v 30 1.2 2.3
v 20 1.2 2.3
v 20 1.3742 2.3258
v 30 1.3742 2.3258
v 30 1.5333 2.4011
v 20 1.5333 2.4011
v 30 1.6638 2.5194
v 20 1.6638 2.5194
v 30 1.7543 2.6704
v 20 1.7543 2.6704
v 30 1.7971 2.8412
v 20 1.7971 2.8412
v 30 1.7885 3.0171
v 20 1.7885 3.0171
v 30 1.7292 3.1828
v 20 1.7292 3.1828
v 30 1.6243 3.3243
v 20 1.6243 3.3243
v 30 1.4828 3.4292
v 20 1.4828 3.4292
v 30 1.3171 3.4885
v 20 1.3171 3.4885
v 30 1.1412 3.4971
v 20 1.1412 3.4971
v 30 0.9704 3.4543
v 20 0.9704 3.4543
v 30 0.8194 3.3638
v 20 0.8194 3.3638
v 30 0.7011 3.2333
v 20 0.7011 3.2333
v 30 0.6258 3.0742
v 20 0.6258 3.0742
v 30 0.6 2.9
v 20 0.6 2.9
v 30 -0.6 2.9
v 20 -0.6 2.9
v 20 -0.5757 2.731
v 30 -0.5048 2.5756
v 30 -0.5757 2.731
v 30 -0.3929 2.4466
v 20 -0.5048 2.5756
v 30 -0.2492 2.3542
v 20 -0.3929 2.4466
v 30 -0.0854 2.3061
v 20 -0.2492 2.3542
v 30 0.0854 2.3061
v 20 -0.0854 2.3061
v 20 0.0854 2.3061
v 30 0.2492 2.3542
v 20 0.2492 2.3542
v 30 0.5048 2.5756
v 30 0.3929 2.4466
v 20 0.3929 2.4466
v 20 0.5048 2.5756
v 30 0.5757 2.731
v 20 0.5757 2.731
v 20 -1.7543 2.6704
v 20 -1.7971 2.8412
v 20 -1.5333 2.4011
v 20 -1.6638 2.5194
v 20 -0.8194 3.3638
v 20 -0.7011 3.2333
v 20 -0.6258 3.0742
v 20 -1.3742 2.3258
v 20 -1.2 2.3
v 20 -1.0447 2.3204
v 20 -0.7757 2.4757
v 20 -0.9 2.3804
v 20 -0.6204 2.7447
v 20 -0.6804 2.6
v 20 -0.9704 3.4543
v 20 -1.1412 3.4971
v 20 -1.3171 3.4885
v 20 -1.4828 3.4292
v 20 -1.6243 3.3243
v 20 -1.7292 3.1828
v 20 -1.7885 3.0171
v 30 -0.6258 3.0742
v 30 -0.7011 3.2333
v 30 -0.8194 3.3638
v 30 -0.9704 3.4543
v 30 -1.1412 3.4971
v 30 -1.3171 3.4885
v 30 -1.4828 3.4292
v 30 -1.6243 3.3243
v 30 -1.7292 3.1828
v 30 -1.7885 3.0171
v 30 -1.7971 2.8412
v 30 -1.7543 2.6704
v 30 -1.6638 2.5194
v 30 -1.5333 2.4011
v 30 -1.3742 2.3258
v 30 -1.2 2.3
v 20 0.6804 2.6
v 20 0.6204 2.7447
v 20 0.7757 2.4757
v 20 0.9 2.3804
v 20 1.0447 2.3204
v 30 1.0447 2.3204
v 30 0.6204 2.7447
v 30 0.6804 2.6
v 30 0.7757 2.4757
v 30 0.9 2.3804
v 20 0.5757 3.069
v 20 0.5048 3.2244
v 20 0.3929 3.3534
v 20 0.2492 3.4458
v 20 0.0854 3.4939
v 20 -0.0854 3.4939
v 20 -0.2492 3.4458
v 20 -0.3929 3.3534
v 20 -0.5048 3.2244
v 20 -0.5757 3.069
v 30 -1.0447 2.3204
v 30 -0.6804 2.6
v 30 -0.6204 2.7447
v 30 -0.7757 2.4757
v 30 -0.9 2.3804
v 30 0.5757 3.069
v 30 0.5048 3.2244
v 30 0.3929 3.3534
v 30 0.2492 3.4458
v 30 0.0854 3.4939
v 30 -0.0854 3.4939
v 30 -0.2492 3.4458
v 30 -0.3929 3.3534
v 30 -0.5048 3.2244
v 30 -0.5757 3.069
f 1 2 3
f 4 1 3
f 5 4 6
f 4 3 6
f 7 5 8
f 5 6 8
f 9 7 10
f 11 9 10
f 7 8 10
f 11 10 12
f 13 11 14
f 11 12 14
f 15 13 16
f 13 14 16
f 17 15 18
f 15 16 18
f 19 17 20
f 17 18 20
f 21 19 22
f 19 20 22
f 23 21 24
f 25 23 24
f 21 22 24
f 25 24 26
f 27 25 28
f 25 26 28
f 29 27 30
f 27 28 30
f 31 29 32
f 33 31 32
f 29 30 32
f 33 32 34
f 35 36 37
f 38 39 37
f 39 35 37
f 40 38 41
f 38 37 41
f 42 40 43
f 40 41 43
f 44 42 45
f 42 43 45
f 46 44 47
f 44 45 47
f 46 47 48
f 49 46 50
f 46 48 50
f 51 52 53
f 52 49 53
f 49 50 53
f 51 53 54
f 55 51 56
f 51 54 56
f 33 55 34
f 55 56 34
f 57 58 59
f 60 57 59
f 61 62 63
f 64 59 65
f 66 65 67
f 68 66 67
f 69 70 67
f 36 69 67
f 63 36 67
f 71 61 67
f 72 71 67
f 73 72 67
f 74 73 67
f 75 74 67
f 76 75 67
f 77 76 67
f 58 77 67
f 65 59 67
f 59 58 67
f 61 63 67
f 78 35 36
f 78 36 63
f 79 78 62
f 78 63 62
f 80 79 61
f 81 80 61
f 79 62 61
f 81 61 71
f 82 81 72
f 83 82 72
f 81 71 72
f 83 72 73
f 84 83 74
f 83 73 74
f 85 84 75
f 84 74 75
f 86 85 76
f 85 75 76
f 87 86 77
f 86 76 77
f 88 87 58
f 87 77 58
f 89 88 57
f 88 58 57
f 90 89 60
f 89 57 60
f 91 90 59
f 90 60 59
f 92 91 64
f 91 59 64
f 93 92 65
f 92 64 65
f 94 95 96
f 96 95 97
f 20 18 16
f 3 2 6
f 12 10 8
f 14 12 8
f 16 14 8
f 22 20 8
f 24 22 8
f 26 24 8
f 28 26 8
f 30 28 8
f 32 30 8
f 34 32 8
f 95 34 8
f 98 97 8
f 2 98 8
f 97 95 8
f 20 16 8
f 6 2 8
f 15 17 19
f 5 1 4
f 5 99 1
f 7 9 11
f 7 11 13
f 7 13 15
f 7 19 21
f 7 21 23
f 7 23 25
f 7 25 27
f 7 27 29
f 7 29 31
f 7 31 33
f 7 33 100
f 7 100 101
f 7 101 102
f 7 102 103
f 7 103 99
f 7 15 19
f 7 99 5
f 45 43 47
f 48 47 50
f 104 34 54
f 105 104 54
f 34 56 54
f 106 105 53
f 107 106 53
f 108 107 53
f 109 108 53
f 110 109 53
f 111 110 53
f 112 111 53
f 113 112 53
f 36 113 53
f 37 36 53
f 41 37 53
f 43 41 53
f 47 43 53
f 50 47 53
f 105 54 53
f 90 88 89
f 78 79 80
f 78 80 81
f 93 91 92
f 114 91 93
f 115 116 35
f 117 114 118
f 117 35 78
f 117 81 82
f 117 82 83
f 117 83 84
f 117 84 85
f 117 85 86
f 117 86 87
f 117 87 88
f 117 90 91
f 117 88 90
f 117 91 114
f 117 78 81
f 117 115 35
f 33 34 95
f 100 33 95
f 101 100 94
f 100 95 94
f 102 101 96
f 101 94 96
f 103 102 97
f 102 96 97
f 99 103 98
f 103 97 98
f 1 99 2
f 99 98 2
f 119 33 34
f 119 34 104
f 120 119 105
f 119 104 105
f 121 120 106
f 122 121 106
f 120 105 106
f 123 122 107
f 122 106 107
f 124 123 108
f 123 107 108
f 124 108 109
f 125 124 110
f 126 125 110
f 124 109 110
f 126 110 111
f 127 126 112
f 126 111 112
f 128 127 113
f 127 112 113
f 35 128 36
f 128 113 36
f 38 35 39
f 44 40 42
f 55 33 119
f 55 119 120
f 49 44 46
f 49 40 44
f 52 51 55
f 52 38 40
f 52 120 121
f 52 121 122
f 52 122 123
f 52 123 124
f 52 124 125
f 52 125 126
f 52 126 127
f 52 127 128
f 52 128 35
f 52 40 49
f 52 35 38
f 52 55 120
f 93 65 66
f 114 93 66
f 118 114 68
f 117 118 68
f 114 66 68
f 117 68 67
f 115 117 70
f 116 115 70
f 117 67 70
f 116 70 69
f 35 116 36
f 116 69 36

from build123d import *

# Parameters (mm, degrees)
CYLINDER002_R           = 0.6
CYLINDER002_DEPTH       = 10
CYLINDER002_PITCH_ANGLE = 90
CYLINDER_R              = 0.6
CYLINDER_DEPTH          = 10
CYLINDER_PITCH_ANGLE    = 90
CYLINDER001_R           = 0.6
CYLINDER001_DEPTH       = 10
CYLINDER001_PITCH_ANGLE = 90


with BuildPart() as blck_wire:
    # Cylinder002 → Cylinder002 (new body)
    with BuildSketch(Plane.XY):
        Circle(CYLINDER002_R)
    extrude(amount=CYLINDER002_DEPTH)


with BuildPart() as blck_wire_1:
    # Cylinder002 pitch: moved
    add(blck_wire.part.rotate(Axis((0, 0, 0), (0, 1, 0)), CYLINDER002_PITCH_ANGLE))


with BuildPart() as blck_wire_2:
    # Cylinder002 placement: moved
    add(blck_wire_1.part.moved(Location((0, -1.2, 0))))


with BuildPart() as white_wire:
    # Cylinder → Cylinder (new body)
    with BuildSketch(Plane.XY):
        Circle(CYLINDER_R)
    extrude(amount=CYLINDER_DEPTH)


with BuildPart() as white_wire_1:
    # Cylinder pitch: moved
    add(white_wire.part.rotate(Axis((0, 0, 0), (0, 1, 0)), CYLINDER_PITCH_ANGLE))


with BuildPart() as white_wire_2:
    # Cylinder placement: moved
    add(white_wire_1.part.moved(Location((0, 1.2, 0))))


with BuildPart() as servo_wires:
    # Cylinder001 → Cylinder001 (new body)
    with BuildSketch(Plane.XY):
        Circle(CYLINDER001_R)
    extrude(amount=CYLINDER001_DEPTH)


with BuildPart() as servo_wires_1:
    # Cylinder001 pitch: moved
    add(servo_wires.part.rotate(Axis((0, 0, 0), (0, 1, 0)), CYLINDER001_PITCH_ANGLE))


with BuildPart() as servo_wires_2:
    # Cylinder001 placement: moved
    add(servo_wires_1.part)

    # Fusion: union blck-wire, white-wire
    add(blck_wire_2.part)
    add(white_wire_2.part)


with BuildPart() as servo_wires_3:
    # Fusion placement: moved
    add(servo_wires_2.part.moved(Location((20, 0, 2.9))))


solid = servo_wires_3.part
